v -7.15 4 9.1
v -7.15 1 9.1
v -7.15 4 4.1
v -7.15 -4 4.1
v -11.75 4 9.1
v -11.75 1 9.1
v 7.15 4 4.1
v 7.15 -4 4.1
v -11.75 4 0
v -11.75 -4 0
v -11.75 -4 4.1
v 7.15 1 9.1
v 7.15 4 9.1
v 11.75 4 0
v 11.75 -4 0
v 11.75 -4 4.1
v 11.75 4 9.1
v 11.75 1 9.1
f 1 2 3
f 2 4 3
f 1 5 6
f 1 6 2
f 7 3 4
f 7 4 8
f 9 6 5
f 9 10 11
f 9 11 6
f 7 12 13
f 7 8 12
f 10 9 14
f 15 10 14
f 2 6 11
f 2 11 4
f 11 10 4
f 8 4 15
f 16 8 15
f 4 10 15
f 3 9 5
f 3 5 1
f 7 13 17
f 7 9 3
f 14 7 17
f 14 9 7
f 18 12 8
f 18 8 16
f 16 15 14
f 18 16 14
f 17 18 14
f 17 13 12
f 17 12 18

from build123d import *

# Parameters (mm, degrees)
F0_W     = 23.5
F0_H     = 8
F1_DEPTH = 4.1
F2_W     = 4.6
F2_H     = 8
F3_DEPTH = 5
F4_SIZE  = 5


with BuildPart() as f1:
    # F0 (on Top) → F1 (new body)
    with BuildSketch(Plane.XY):
        Rectangle(F0_W, F0_H)
    extrude(amount=F1_DEPTH)

    # F2 (on face) → F3 (join)
    with BuildSketch(Plane.XY.offset(4.1)):
        with Locations((-9.45, 0)):
            Rectangle(F2_W, F2_H)
        with Locations((9.45, 0)):
            Rectangle(F2_W, F2_H)
    extrude(amount=F3_DEPTH)

    # F4
    f4_edges = [f1.edges().sort_by_distance(p)[0] for p in [
        (-9.45, -4, 9.1),
        (9.45, -4, 9.1),
    ]]
    chamfer(f4_edges, length=F4_SIZE)


solid = f1.part
